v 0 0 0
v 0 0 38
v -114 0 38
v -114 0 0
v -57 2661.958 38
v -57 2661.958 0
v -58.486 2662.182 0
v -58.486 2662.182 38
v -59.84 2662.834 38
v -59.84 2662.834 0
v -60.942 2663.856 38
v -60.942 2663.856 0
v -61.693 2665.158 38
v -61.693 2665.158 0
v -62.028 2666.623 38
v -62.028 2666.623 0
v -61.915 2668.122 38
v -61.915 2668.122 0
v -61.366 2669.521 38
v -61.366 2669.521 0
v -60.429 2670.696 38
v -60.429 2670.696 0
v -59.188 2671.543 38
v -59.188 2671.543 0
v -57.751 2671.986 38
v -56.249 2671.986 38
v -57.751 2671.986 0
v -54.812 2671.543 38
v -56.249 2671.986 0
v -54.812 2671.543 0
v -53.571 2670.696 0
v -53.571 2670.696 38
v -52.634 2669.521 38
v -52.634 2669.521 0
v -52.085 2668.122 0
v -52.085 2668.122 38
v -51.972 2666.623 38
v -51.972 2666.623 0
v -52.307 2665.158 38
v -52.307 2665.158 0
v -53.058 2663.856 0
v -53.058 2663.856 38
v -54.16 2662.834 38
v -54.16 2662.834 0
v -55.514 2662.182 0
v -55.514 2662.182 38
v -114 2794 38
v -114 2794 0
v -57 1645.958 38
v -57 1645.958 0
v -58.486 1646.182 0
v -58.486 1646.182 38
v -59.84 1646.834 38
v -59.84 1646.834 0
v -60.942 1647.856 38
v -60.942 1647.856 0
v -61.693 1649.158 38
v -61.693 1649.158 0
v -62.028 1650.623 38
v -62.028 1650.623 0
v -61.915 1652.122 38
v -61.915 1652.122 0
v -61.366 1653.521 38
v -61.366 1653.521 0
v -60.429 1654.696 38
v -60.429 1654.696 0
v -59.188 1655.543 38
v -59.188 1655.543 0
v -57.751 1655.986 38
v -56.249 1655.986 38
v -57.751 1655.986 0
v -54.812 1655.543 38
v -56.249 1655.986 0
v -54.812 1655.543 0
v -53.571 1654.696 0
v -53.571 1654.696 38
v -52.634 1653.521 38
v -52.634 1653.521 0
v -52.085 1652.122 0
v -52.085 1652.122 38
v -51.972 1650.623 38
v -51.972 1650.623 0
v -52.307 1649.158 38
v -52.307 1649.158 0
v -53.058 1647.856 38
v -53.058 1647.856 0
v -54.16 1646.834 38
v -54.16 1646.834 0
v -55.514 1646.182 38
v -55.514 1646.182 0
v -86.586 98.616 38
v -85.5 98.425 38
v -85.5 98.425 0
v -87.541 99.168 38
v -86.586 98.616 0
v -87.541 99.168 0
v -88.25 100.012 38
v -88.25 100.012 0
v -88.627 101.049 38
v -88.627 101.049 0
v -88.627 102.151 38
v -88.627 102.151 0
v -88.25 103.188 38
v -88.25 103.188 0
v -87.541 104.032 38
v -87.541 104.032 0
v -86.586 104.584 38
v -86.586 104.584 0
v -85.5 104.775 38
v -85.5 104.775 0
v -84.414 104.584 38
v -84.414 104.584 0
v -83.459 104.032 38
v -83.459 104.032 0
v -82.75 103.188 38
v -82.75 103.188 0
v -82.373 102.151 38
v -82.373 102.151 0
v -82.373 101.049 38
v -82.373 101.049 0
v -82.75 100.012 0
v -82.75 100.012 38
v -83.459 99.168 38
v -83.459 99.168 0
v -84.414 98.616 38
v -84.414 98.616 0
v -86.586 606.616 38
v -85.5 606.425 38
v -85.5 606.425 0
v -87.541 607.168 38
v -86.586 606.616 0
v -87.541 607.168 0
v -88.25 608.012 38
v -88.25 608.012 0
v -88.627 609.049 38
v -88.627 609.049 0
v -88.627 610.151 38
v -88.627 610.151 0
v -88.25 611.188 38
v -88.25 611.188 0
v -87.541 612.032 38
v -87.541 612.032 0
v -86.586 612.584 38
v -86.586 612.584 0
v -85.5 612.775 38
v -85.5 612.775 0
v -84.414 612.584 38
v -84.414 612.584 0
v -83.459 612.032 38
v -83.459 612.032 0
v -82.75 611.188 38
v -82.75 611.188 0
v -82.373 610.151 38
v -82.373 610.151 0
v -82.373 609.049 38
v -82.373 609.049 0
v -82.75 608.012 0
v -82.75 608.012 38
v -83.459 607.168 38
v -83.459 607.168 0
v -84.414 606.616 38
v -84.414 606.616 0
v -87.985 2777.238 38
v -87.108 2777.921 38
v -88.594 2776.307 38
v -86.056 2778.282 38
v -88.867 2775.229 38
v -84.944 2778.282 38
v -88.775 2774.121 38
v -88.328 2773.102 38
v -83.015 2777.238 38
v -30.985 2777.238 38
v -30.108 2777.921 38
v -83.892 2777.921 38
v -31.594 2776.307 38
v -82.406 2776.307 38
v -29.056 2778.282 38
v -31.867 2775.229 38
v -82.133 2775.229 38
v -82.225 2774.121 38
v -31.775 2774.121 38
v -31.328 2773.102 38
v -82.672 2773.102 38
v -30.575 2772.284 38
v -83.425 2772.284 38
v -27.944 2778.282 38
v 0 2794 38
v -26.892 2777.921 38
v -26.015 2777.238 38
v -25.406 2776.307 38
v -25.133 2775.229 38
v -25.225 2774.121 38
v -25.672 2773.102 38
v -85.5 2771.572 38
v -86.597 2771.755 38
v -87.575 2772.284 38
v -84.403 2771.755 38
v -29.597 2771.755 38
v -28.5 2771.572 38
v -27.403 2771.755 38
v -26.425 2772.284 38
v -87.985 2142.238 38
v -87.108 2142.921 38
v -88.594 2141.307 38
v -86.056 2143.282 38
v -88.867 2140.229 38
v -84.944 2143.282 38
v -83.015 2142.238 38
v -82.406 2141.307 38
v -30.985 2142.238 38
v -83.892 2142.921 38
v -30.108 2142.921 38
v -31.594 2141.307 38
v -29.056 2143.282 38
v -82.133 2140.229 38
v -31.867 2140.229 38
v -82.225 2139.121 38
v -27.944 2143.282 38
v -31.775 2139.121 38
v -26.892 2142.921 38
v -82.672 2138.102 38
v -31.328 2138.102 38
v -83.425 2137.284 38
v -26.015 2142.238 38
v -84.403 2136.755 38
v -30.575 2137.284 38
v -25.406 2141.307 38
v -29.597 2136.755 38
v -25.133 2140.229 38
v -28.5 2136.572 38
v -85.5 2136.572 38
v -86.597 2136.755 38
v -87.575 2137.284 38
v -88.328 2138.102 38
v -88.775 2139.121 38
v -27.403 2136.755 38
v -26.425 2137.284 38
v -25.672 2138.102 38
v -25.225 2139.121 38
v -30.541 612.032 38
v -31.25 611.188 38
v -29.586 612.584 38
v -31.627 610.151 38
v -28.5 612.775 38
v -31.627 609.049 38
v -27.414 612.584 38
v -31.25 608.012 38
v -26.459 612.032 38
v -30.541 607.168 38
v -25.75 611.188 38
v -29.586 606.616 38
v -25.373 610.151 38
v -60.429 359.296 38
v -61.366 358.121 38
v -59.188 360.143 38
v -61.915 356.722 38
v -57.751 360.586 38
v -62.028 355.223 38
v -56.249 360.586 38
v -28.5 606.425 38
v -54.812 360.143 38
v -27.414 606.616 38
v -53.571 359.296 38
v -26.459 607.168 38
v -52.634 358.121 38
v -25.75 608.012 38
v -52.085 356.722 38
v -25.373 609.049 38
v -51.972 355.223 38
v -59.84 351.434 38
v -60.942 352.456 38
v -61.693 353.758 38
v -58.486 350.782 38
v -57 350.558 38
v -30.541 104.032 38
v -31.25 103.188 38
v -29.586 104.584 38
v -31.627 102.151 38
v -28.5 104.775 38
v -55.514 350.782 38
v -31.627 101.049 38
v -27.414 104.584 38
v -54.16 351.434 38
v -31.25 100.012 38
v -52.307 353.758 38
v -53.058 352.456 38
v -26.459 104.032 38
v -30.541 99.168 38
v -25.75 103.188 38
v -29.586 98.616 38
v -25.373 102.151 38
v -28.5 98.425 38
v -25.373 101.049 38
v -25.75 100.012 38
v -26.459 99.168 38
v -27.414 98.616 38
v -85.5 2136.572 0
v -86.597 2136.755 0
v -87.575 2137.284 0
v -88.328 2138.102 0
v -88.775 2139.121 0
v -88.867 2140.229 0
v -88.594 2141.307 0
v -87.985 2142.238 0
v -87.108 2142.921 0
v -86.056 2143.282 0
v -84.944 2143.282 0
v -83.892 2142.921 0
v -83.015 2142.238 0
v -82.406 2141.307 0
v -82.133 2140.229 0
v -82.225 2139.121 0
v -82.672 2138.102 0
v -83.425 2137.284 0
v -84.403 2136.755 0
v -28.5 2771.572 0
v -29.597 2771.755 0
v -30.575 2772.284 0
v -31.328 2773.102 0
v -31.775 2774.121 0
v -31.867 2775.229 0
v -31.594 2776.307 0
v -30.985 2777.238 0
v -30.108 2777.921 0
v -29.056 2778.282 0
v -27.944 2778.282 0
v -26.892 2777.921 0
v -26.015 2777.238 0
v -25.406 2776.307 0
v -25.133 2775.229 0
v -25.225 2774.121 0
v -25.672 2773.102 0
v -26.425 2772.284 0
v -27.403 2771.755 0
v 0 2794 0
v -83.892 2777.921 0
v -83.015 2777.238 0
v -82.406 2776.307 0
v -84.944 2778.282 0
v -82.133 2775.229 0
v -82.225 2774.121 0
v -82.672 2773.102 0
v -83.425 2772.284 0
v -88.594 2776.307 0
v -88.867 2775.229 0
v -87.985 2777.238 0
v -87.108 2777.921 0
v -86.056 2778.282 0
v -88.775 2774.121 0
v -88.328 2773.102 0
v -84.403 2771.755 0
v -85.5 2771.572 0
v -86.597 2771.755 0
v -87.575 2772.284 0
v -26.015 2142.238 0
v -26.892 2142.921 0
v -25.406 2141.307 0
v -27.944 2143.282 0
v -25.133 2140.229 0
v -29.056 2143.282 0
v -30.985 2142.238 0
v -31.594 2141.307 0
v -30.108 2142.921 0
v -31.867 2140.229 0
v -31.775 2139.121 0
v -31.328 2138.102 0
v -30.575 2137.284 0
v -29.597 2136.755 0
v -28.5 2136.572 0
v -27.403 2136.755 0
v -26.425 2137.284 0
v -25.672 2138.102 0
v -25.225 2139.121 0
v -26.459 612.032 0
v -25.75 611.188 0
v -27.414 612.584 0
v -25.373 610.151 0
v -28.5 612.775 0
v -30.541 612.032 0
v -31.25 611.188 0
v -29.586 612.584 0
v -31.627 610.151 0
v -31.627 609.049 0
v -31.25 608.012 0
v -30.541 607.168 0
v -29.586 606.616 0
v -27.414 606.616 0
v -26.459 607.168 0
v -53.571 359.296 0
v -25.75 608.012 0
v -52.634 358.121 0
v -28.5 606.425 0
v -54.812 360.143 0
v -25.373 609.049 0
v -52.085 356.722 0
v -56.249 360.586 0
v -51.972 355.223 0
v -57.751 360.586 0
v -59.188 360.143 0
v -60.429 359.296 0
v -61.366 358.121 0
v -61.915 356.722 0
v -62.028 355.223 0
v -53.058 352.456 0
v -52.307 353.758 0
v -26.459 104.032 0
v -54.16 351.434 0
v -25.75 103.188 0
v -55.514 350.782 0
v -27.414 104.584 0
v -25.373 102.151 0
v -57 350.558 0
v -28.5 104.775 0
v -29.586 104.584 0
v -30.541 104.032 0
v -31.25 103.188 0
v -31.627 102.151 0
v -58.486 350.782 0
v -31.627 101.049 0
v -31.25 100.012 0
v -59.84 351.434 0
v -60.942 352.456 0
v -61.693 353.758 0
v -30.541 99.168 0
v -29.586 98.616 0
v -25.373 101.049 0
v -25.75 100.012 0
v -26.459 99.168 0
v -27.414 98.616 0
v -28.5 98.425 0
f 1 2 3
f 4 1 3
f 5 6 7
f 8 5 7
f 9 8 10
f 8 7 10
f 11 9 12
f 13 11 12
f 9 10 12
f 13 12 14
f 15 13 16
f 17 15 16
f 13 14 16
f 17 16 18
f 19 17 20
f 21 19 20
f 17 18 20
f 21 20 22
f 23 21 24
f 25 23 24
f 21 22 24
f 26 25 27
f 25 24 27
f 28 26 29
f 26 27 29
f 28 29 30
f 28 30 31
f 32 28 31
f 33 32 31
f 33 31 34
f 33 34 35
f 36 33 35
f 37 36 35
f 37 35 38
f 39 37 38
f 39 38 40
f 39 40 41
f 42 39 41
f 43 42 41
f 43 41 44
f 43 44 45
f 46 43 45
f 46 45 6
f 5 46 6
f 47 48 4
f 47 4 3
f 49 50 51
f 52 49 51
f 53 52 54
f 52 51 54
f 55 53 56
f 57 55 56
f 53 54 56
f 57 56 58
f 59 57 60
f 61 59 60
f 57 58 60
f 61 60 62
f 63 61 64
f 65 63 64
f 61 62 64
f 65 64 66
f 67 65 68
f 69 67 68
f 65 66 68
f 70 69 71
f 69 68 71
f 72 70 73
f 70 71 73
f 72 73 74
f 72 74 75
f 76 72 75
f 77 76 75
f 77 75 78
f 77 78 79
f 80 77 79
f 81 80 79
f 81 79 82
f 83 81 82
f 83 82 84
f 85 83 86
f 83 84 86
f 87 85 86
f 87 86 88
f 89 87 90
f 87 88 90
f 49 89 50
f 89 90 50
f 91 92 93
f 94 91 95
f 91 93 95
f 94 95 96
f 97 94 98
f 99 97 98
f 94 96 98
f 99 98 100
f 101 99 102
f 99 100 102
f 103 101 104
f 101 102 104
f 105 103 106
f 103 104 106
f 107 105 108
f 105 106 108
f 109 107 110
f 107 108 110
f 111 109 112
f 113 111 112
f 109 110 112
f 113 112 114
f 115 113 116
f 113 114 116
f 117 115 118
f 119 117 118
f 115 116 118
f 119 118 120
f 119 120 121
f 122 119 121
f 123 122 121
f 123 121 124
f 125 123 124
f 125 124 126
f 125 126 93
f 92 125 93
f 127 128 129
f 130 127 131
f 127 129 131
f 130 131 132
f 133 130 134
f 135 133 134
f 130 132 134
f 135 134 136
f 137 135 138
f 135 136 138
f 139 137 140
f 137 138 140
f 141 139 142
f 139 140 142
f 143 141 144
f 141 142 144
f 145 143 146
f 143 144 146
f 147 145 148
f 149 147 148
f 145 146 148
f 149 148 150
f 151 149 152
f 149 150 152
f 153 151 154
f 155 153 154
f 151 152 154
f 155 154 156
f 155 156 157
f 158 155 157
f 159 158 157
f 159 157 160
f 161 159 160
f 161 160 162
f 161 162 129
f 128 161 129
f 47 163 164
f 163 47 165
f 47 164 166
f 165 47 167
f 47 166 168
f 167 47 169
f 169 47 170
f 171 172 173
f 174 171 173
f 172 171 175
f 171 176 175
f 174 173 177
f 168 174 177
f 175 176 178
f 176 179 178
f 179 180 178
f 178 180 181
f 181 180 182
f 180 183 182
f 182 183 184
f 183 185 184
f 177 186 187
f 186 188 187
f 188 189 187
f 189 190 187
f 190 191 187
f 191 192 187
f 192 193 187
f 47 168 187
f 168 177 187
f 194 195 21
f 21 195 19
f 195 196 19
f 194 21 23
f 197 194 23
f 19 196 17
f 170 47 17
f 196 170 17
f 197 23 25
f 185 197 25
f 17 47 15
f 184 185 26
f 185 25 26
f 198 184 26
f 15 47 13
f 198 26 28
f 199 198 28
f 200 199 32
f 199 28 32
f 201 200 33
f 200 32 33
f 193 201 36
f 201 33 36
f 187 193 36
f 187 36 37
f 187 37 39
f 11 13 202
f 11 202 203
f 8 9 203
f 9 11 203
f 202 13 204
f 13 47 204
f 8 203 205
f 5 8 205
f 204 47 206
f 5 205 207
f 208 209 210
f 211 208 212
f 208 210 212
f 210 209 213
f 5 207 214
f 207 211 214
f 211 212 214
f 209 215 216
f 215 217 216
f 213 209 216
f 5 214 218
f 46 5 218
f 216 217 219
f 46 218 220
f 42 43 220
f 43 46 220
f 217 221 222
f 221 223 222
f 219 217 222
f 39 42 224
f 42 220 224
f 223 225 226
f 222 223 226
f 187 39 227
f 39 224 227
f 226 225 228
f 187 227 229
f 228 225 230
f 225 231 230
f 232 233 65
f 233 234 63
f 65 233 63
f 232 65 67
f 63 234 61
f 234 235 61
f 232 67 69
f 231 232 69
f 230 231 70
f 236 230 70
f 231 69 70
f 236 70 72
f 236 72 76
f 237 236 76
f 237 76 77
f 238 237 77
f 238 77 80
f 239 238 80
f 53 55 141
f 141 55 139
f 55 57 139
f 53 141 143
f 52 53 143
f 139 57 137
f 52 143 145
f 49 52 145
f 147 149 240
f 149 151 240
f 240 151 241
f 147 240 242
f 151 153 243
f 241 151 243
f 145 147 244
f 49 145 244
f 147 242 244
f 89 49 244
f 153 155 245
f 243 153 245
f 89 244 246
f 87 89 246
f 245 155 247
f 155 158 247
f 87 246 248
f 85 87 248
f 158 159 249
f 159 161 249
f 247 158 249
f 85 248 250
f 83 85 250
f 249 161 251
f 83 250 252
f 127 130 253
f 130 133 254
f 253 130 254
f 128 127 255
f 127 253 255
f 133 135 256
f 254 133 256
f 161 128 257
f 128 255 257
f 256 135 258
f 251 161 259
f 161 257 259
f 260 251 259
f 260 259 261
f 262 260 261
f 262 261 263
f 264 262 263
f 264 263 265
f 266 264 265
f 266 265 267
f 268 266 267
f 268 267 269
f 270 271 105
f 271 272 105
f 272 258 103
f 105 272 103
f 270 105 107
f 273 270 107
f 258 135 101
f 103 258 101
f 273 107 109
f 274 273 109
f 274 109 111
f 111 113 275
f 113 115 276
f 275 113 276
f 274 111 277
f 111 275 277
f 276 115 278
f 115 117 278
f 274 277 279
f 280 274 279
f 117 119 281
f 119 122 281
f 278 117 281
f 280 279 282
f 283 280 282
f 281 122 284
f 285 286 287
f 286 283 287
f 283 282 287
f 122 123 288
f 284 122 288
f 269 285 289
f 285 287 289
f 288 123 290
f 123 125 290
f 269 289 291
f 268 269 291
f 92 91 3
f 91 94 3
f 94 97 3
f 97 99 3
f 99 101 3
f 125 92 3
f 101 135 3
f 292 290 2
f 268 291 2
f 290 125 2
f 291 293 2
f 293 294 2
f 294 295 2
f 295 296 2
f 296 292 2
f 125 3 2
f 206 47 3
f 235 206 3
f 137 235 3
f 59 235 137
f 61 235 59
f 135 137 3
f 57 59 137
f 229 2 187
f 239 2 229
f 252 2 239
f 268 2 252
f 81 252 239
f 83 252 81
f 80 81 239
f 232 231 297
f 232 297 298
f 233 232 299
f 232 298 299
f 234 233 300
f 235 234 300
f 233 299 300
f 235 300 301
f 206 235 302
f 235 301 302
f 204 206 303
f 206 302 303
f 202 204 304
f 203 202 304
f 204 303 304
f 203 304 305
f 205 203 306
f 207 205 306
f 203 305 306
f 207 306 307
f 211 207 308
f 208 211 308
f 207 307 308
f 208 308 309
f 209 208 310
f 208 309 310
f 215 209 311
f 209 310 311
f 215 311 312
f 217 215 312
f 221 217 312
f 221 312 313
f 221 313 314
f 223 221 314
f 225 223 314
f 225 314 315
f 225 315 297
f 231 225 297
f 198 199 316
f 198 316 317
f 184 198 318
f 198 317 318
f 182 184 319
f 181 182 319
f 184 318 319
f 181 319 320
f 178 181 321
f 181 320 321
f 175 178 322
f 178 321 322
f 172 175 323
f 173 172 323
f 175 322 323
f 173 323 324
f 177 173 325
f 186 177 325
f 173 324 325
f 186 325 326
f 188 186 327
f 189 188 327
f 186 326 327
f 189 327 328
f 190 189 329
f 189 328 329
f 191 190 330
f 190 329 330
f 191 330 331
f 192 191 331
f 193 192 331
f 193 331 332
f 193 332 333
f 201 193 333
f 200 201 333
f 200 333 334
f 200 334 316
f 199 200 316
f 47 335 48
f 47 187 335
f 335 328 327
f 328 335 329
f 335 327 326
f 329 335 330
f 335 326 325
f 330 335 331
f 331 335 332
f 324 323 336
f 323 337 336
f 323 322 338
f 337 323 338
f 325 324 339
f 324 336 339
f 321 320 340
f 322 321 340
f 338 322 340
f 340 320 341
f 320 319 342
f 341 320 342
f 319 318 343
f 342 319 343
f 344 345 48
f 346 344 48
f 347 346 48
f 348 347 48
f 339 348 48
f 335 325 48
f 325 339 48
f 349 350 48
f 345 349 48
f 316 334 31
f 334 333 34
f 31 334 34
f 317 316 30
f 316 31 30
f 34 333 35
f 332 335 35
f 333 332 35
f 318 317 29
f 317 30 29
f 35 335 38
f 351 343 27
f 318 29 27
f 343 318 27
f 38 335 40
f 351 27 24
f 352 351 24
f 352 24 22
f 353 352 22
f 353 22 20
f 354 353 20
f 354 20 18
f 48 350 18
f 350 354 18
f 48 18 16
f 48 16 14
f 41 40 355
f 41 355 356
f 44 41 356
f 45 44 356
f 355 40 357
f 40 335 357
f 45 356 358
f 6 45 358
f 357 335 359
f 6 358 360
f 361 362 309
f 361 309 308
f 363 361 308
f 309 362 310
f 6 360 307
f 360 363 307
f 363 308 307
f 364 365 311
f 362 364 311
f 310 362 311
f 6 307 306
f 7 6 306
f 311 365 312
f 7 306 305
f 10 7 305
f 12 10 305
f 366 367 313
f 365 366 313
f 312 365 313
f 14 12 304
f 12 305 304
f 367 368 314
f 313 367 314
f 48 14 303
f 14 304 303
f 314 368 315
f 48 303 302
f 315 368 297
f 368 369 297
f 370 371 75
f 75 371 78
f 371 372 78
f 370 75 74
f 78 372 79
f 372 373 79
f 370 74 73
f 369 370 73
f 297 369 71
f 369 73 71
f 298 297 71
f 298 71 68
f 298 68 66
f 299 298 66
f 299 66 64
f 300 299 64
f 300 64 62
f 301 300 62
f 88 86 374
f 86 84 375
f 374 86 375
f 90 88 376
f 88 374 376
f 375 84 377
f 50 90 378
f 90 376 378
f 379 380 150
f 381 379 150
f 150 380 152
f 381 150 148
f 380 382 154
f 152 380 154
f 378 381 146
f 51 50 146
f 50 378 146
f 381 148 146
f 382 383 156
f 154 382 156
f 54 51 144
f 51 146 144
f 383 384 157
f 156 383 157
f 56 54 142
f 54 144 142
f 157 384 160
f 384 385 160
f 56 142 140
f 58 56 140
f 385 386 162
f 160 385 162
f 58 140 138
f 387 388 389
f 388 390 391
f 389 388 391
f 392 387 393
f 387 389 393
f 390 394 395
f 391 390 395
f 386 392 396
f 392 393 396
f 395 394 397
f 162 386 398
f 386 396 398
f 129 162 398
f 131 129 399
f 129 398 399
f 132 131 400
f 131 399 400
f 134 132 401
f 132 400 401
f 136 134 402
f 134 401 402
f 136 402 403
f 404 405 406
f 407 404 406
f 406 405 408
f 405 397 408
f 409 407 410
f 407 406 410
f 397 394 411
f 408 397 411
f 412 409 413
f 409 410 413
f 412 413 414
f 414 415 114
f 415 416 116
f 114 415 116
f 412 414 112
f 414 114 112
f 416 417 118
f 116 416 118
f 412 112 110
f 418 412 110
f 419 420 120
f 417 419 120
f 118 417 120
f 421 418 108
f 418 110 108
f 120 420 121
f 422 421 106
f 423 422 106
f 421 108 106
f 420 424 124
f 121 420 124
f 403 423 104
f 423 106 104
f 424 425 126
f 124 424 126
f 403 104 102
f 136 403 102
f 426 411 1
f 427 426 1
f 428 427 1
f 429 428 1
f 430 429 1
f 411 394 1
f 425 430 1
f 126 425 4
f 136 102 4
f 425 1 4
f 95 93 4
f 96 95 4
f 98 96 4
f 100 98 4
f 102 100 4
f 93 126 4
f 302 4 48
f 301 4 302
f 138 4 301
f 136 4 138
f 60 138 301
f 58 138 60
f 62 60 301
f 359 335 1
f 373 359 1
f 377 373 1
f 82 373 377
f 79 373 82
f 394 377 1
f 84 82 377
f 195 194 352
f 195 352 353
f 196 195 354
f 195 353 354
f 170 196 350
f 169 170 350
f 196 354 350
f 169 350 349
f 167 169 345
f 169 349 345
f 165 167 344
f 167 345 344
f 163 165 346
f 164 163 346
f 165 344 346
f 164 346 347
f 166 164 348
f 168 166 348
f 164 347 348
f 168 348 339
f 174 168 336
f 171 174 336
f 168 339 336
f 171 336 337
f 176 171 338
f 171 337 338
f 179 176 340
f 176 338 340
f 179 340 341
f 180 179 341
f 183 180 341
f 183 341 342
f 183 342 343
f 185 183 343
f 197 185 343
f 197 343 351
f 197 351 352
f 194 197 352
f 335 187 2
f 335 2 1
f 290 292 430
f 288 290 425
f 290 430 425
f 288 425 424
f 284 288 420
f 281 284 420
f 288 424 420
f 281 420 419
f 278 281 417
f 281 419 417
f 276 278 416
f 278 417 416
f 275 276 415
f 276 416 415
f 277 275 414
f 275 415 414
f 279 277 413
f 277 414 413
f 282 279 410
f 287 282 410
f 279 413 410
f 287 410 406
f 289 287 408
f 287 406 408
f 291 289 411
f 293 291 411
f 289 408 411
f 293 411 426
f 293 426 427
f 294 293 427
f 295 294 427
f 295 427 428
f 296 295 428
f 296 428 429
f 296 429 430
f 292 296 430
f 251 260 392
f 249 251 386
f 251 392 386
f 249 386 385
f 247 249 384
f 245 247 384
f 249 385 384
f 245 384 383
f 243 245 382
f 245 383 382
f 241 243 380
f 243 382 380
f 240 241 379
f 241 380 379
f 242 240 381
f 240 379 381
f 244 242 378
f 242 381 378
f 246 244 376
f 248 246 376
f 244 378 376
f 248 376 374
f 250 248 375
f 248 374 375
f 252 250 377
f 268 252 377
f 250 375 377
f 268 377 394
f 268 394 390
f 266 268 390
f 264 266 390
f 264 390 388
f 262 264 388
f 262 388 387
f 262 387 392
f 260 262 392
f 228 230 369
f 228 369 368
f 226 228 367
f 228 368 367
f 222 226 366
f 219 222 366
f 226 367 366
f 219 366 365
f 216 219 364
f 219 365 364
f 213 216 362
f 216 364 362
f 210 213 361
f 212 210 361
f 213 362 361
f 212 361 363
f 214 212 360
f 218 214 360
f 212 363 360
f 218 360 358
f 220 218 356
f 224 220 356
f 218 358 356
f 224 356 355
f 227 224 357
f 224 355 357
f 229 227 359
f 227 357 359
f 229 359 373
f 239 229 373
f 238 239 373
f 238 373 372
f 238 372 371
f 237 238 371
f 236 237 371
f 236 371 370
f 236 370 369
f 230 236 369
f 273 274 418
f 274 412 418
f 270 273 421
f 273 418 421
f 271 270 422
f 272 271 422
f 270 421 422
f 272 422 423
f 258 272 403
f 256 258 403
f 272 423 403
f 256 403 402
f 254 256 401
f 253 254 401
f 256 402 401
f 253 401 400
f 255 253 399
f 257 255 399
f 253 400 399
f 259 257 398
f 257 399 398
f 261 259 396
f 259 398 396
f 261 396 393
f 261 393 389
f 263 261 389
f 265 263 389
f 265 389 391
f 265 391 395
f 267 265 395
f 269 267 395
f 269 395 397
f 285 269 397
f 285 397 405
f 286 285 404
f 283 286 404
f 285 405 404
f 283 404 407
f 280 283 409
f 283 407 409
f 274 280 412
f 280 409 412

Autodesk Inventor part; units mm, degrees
ref_plane "YZ Plane" through (0, 0, 0) normal (1, 0, 0) x (0, 1, 0)
ref_plane "XZ Plane" through (0, 0, 0) normal (0, 1, 0) x (-1, 0, 0)
ref_plane "XY Plane" through (0, 0, 0) normal (0, 0, 1) x (1, 0, 0)
sketch "Sketch1" plane through (0, 0, 0) normal (0, 1, 0) x (-1, 0, 0)
  line L0 (0, 0) -> (114, 0)
  line L1 (114, 0) -> (114, 38)
  line L2 (114, 38) -> (0, 38)
  line L3 (0, 38) -> (0, 0)
  dimension "d0" = 114
  dimension "d1" = 38
extrude "Extrusion1" add sketch "Sketch1" along normal blind 2794
sketch "Sketch3" plane through (-114, 0, 38) normal (0, 0, 1) x (1, 0, 0)
  line L0 (0, 0) -> (114, 0) projected
  line L1 (0, 0) -> (0, 2794) projected
  circle A0 centre (28.5, 101.6) radius 5.7238
  circle A1 centre (85.5, 101.6) radius 5.7238
  circle A2 centre (28.5, 609.6) radius 5.7238
  circle A3 centre (85.5, 609.6) radius 5.7238
  dimension "d28" = 101.6
  dimension "d29" = 28.5
  dimension "d32" = 57
  dimension "d35" = 508
hole "rimArm" at (-85.5, 609.6, 38) at (-28.5, 609.6, 38) at (-85.5, 101.6, 38) at (-28.5, 101.6, 38) direction (0, 0, -1) diameter 6.35 end through all
sketch "Sketch4" plane through (-114, 0, 38) normal (0, 0, 1) x (1, 0, 0)
  line L0 (0, 2794) -> (114, 2794) projected
  line L1 (0, 0) -> (0, 2794) projected
  circle A0 centre (28.5, 2774.95) radius 4.8454
  circle A1 centre (85.5, 2774.95) radius 4.8454
  circle A2 centre (28.5, 2139.95) radius 4.8454
  circle A3 centre (85.5, 2139.95) radius 4.8454
  dimension "d45" = 19.05
  dimension "d48" = 57
  dimension "d51" = 635
  dimension "d71" = 28.5
hole "screenArm" at (-85.5, 2774.95, 38) at (-28.5, 2774.95, 38) at (-28.5, 2139.95, 38) at (-85.5, 2139.95, 38) direction (0, 0, -1) diameter 6.7564 end through all clearance for "Flat Head Machine Screw (82)" size "1/4" standard "Ansi Unified Screw Threads"
sketch "Sketch5" plane through (-114, 0, 38) normal (0, 0, 1) x (1, 0, 0)
  line L0 (0, 0) -> (114, 0) projected
  line L1 (0, 2794) -> (114, 2794) projected
  circle A0 centre (57, 2667) radius 8.4367
  circle A1 centre (57, 1651) radius 12.5456
  circle A2 centre (57, 355.6) radius 11.5895
  line L2 (0, 0) -> (0, 2794) projected
  dimension "d61" = 127
  dimension "d62" = 355.6
  dimension "d70" = 1651
  dimension "d72" = 57
  dimension "d73" = 57
  dimension "d74" = 57
hole "poleAttach" at (-57, 2667, 38) at (-57, 1651, 38) at (-57, 355.6, 38) direction (0, 0, -1) diameter 10.0838 end through all clearance for "Flat Head Machine Screw (82)" size "3/8" standard "Ansi Unified Screw Threads"
equation "\"d29\" = 0.25 * d0"
equation "\"d32\" = 0.5 * d0"
equation "\"d48\" = 0.5 * d0"
equation "\"d71\" = 0.25 * d0"
equation "\"d72\" = 0.5 * d0"
equation "\"d73\" = 0.5 * d0"
equation "\"d74\" = 0.5 * d0"
properties part number "2p2psv" material "Wood (Cherry)"
